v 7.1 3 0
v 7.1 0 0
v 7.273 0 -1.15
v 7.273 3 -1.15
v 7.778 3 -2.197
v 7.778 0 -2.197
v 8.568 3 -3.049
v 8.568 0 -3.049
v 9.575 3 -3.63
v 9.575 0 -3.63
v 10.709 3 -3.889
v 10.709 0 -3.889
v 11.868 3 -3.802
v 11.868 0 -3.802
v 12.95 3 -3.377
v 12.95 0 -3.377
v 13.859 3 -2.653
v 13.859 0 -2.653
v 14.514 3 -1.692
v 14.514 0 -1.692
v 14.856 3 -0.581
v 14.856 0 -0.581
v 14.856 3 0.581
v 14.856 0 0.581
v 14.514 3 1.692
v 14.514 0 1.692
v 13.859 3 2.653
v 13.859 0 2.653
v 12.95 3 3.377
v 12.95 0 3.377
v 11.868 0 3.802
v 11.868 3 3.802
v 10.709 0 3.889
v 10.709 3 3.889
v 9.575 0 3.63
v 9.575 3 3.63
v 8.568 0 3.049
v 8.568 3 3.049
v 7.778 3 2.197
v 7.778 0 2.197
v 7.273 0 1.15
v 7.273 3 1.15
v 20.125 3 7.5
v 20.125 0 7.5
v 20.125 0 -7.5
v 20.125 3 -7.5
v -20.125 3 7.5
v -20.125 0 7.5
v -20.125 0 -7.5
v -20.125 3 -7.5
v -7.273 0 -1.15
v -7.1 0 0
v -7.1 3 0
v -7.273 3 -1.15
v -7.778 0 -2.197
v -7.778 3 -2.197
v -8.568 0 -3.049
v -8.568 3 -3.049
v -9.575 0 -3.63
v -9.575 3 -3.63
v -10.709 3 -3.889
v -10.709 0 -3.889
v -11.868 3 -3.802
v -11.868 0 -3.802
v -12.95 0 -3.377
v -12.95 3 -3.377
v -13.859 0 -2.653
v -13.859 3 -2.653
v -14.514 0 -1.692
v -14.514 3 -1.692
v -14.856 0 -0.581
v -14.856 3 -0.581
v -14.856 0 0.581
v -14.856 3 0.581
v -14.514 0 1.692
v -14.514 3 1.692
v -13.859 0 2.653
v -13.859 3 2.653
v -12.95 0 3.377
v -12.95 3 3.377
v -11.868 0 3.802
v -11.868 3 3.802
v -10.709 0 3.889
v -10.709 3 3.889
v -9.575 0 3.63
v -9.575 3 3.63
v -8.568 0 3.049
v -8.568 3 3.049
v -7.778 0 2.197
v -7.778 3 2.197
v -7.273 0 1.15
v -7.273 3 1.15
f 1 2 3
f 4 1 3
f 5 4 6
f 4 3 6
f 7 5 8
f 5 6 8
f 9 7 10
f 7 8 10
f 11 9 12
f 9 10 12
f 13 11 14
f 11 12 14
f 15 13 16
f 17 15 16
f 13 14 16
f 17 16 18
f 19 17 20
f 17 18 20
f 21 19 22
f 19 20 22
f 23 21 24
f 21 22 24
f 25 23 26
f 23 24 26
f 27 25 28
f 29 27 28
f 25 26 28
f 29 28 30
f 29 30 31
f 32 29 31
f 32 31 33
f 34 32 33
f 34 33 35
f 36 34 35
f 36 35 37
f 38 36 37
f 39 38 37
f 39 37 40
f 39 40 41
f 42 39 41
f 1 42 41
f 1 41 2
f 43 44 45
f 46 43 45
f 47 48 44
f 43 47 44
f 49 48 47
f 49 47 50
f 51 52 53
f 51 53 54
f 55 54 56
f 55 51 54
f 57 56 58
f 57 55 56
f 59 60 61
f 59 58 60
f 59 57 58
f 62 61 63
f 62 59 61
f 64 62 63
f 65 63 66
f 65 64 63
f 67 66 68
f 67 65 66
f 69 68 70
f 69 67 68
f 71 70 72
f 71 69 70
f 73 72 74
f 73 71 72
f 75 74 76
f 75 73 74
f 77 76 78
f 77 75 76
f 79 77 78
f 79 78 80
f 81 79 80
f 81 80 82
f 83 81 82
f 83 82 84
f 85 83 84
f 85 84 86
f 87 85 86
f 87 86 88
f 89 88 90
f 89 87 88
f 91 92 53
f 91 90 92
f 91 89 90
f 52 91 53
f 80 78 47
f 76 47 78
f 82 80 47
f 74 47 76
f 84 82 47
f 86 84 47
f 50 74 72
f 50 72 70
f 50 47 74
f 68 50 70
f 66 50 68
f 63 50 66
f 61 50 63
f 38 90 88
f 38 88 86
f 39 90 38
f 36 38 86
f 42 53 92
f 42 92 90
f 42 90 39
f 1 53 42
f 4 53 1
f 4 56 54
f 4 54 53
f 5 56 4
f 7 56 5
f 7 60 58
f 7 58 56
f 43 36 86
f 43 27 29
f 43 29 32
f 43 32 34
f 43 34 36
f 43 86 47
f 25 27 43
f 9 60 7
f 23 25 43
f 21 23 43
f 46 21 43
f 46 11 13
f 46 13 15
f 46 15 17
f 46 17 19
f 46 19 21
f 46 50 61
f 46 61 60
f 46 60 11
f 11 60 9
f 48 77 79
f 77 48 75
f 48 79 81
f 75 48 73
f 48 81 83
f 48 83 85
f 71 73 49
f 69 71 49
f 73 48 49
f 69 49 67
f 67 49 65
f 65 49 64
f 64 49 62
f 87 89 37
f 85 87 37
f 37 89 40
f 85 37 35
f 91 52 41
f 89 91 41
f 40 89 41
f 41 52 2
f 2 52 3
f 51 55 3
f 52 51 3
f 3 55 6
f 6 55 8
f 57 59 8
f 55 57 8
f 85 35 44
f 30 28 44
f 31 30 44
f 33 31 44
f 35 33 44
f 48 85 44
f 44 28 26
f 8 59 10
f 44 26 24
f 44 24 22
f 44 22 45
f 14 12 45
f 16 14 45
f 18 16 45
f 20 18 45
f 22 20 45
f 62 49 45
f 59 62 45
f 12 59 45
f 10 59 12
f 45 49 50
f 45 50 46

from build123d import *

# Parameters (mm, degrees)
SKETCH1_W           = 40.25
SKETCH1_H           = 15
BOSS_EXTRUDE1_DEPTH = 3
CUT_EXTRUDE1_START  = -4
SKETCH2_R           = 3.9
CUT_EXTRUDE1_DEPTH  = 5


with BuildPart() as part:
    # Sketch1 → Boss-Extrude1 (new body)
    with BuildSketch(Plane(origin=(0, 0, 0), x_dir=(1, 0, 0), z_dir=(0, 1, 0))):
        Rectangle(SKETCH1_W, SKETCH1_H)
    extrude(amount=BOSS_EXTRUDE1_DEPTH)

    # Sketch2 → Cut-Extrude1 (cut)
    with BuildSketch(Plane(origin=(0, 3, 0), x_dir=(1, 0, 0), z_dir=(0, 1, 0)).offset(CUT_EXTRUDE1_START)):
        with Locations((-11, 0)):
            Circle(SKETCH2_R)
    cut_extrude1 = extrude(amount=CUT_EXTRUDE1_DEPTH, mode=Mode.SUBTRACT)

    # Mirror1: Cut-Extrude1 across plane
    add(cut_extrude1.mirror(Plane(origin=(0, 0, 0), x_dir=(0, 0, 1), z_dir=(1, 0, 0))), mode=Mode.SUBTRACT)


solid = part.part
